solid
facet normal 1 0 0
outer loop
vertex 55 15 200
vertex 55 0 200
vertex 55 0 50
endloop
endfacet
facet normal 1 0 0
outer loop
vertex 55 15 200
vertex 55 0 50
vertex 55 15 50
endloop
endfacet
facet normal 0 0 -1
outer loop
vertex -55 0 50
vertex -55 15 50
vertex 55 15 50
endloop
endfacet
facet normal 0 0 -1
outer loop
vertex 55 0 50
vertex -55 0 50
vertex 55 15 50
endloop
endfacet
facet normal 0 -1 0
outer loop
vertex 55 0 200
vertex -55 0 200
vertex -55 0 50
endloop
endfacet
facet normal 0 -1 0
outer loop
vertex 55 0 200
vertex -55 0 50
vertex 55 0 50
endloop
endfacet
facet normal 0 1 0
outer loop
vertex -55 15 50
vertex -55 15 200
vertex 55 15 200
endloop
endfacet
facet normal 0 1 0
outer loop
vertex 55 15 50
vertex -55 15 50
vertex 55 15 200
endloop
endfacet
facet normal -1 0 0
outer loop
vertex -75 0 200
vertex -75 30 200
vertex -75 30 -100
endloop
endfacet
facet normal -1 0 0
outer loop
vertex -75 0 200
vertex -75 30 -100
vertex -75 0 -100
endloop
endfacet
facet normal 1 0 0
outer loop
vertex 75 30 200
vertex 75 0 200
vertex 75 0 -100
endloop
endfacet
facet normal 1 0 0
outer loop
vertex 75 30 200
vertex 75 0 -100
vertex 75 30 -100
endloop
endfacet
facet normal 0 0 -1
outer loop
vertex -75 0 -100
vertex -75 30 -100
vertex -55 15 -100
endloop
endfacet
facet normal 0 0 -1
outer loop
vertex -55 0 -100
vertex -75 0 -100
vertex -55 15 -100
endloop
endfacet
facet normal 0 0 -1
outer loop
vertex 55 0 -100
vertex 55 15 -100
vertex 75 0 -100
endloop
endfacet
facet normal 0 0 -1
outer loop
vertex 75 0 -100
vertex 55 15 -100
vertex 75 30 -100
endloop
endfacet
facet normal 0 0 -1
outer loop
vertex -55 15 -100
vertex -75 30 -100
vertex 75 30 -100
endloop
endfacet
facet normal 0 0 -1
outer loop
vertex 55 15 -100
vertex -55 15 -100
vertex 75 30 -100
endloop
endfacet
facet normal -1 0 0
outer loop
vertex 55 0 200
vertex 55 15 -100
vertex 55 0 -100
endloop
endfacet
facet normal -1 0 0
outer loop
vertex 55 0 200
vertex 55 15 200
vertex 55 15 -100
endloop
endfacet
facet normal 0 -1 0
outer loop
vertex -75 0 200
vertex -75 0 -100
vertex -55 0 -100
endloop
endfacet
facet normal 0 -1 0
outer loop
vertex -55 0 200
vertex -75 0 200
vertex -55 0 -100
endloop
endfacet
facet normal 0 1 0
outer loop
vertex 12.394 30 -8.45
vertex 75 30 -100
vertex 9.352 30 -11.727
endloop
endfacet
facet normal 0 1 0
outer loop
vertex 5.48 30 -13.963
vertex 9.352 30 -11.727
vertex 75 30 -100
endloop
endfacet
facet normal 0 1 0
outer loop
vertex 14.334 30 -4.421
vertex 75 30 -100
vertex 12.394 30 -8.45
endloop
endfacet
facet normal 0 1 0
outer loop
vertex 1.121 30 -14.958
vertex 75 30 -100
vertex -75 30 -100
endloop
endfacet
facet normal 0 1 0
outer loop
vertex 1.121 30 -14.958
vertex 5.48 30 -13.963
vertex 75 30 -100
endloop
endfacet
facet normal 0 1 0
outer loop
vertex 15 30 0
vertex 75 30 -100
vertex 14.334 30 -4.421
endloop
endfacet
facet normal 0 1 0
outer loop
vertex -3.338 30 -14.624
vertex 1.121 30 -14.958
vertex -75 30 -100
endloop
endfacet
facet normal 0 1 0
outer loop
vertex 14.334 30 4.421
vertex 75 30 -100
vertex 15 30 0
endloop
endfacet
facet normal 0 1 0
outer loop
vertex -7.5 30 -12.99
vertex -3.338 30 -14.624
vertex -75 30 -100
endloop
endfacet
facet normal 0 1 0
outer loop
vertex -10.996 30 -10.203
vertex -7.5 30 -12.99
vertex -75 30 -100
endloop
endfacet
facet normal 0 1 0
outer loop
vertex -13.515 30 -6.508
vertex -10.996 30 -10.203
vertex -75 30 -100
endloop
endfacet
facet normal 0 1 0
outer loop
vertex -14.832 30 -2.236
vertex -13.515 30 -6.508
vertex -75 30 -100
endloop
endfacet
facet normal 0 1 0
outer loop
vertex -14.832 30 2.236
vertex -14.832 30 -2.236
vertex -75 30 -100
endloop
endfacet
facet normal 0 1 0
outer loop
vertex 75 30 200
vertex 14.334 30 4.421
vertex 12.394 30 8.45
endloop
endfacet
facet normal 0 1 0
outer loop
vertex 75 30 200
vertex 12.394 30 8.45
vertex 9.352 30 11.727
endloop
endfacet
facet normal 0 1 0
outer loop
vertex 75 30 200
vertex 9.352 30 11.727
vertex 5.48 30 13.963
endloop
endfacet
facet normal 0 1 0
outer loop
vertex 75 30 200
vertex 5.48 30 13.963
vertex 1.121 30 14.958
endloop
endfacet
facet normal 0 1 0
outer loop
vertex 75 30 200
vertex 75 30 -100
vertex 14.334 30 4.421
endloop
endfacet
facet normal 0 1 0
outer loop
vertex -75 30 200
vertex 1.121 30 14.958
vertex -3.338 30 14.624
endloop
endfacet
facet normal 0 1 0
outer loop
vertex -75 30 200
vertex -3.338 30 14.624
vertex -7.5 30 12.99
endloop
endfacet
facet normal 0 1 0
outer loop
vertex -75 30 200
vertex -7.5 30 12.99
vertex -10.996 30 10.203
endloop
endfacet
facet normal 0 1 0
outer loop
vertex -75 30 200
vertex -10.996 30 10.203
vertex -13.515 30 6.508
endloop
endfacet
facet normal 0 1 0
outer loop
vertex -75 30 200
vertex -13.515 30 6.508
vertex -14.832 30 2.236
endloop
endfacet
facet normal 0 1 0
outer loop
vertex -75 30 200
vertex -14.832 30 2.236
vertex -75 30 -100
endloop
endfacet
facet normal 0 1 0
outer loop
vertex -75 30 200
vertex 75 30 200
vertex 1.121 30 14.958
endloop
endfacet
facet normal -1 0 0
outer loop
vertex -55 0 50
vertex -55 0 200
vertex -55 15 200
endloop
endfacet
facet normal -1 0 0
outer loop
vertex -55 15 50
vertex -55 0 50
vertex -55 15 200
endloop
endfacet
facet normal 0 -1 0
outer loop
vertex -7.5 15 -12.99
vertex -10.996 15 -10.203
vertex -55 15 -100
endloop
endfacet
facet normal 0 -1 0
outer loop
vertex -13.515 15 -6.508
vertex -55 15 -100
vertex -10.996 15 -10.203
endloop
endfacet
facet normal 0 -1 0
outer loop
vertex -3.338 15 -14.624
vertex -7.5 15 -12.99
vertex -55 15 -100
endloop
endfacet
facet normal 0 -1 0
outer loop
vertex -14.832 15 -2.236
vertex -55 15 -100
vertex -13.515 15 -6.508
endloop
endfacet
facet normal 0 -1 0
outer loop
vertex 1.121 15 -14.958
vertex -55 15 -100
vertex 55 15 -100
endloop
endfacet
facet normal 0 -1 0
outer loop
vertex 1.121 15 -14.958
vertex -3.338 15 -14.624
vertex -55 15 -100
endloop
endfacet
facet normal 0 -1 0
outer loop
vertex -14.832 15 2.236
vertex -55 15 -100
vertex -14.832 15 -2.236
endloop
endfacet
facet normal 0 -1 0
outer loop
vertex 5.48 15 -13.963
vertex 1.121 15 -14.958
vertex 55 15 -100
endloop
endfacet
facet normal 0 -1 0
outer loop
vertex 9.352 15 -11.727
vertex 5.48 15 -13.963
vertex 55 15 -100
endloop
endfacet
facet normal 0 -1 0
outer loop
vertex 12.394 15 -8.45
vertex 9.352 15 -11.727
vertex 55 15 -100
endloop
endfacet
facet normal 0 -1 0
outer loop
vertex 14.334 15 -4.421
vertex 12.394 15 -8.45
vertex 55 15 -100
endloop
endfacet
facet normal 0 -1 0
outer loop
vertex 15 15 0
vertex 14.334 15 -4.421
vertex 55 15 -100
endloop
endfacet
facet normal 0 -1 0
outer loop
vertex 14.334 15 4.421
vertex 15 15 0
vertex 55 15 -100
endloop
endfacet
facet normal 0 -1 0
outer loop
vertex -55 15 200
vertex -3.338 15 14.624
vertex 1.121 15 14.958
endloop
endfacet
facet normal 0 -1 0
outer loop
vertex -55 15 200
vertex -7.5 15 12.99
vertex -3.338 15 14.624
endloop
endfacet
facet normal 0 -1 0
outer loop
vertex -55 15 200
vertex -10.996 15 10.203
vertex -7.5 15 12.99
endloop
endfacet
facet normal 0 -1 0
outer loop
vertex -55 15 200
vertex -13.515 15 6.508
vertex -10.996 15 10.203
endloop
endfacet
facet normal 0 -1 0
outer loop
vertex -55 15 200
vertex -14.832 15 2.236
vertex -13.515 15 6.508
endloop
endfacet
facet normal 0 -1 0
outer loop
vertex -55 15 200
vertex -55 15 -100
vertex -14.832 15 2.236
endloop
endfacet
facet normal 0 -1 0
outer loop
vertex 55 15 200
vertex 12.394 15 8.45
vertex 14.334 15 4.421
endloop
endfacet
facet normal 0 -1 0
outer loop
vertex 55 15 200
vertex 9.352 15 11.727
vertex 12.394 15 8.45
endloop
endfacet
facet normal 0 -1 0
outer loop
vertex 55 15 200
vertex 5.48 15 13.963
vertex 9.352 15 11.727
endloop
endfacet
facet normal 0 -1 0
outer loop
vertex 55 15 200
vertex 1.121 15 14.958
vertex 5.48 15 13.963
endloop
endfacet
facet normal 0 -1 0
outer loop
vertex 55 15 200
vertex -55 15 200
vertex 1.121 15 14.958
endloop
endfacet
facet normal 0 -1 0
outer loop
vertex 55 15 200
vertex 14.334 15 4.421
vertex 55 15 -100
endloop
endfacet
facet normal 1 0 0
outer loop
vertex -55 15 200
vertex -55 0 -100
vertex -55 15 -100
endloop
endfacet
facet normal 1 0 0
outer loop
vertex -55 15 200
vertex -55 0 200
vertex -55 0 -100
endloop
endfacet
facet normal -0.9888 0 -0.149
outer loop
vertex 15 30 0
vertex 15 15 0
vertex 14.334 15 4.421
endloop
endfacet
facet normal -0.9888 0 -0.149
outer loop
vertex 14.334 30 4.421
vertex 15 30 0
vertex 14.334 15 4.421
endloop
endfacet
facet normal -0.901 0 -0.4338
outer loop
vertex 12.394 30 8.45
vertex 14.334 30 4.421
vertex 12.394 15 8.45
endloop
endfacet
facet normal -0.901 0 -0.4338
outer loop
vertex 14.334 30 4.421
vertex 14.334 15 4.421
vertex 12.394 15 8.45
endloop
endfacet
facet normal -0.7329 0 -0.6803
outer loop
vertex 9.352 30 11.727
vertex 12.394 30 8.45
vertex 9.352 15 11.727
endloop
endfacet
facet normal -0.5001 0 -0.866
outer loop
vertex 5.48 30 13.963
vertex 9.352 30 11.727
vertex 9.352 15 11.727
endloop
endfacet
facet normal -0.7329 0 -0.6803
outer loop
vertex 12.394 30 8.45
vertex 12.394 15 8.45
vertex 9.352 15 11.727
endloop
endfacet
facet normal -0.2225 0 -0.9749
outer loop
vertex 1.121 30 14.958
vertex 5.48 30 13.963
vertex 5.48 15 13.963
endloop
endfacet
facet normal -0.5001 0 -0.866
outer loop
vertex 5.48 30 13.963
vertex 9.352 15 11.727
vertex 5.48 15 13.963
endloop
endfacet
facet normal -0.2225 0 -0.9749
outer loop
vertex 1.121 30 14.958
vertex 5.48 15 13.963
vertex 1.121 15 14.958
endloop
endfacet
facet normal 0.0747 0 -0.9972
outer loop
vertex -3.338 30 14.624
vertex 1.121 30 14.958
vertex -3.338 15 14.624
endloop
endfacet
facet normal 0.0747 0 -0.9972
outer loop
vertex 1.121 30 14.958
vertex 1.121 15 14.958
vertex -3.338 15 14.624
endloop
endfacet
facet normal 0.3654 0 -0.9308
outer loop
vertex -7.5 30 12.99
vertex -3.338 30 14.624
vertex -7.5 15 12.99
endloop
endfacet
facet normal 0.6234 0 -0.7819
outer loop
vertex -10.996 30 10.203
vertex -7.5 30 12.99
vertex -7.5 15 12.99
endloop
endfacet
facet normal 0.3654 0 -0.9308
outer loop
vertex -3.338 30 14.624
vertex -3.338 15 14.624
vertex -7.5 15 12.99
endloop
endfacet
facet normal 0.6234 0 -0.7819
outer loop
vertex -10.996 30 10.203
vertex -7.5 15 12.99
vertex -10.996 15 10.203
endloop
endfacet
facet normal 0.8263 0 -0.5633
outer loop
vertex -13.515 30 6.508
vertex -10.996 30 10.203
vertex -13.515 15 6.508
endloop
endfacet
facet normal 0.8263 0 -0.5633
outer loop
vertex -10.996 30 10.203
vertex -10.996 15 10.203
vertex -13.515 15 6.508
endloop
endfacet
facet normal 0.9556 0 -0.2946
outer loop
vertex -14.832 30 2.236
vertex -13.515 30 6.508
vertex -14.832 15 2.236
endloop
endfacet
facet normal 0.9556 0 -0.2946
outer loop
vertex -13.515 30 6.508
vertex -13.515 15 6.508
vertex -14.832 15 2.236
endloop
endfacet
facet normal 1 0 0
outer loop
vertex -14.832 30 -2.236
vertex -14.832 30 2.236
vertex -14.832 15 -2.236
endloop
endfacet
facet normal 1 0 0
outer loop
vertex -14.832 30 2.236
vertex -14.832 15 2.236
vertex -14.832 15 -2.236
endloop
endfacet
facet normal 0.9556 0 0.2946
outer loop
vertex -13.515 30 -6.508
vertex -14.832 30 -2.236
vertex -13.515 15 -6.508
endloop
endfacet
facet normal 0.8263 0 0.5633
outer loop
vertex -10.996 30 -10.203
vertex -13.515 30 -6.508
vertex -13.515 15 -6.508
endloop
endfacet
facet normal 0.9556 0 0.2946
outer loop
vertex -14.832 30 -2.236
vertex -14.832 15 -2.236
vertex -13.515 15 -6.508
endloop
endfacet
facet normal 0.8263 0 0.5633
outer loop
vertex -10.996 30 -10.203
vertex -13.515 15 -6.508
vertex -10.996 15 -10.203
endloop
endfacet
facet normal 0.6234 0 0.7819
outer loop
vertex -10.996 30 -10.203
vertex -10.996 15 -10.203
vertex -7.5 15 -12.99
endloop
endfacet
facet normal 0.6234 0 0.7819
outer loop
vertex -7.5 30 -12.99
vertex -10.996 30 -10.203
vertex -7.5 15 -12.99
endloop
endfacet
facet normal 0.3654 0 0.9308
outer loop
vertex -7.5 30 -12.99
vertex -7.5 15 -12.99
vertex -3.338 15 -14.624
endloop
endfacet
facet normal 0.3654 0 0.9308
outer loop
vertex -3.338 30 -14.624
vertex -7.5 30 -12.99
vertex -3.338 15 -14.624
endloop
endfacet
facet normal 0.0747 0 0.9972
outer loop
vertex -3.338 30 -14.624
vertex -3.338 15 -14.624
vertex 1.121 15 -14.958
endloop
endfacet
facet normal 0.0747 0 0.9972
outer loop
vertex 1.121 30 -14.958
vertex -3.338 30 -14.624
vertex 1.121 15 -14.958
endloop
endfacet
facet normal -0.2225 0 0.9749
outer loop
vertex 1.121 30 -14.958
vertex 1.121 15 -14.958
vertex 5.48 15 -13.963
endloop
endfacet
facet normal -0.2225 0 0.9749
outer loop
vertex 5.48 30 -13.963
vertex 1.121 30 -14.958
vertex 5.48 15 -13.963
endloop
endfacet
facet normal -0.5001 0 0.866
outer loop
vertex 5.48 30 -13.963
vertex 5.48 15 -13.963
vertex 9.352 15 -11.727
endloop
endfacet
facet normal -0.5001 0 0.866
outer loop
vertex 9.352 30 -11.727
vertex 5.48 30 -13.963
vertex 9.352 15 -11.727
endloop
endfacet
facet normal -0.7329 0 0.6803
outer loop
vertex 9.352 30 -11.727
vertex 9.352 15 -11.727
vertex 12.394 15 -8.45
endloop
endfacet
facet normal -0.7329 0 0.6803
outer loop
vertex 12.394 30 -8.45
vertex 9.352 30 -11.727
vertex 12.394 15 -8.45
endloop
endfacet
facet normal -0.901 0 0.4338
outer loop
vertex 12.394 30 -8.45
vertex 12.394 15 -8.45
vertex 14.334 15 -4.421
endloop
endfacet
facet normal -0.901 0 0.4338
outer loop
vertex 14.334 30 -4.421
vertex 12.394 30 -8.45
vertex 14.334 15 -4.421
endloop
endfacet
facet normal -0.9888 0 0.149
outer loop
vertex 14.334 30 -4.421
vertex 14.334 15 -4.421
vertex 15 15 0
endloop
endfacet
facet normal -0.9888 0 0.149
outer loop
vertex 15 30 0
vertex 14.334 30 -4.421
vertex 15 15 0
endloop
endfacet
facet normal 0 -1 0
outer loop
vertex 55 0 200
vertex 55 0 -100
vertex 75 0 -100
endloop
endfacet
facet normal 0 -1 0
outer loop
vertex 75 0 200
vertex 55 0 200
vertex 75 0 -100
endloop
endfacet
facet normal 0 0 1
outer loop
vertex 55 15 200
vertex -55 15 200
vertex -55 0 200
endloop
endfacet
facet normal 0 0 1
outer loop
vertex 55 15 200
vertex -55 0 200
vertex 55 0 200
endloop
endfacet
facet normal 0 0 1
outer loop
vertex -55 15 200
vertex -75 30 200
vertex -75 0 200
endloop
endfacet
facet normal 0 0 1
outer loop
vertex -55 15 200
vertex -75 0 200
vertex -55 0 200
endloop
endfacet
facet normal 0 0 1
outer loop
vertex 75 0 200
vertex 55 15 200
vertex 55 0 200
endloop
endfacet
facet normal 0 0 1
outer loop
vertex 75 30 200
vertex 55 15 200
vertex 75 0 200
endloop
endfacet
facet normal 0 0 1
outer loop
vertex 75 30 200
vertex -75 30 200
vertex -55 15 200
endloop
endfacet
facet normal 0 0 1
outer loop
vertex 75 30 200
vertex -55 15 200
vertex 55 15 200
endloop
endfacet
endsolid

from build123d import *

# Parameters (mm, degrees)
F1_DEPTH      = 200
F1_DEPTH_BACK = 100
F2_R          = 15
F3_DEPTH      = 20
F4_W          = 110
F4_H          = 15
F5_DEPTH      = 150


with BuildPart() as f1:
    # F0 (on Top) → F1 (new body, two sides)
    with BuildSketch(Plane.XY) as f1_sk:
        Polygon((55, 15), (55, 0), (75, 0), (75, 30), (0, 30), (0, 15), align=None)
        Polygon((-55, 15), (0, 15), (0, 30), (-75, 30), (-75, 0), (-55, 0), align=None)
    extrude(amount=F1_DEPTH)
    extrude(f1_sk.sketch, amount=-F1_DEPTH_BACK)

    # F2 (on face) → F3 (cut)
    with BuildSketch(Plane.XZ.offset(-15)):
        Circle(F2_R)
    extrude(amount=-F3_DEPTH, mode=Mode.SUBTRACT)


with BuildPart() as f5:
    # F4 (on face) → F5 (new body)
    with BuildSketch(Plane.XY.offset(200)):
        with Locations((0, 7.5)):
            Rectangle(F4_W, F4_H)
    extrude(amount=-F5_DEPTH)


solid = Compound([f1.part, f5.part])
